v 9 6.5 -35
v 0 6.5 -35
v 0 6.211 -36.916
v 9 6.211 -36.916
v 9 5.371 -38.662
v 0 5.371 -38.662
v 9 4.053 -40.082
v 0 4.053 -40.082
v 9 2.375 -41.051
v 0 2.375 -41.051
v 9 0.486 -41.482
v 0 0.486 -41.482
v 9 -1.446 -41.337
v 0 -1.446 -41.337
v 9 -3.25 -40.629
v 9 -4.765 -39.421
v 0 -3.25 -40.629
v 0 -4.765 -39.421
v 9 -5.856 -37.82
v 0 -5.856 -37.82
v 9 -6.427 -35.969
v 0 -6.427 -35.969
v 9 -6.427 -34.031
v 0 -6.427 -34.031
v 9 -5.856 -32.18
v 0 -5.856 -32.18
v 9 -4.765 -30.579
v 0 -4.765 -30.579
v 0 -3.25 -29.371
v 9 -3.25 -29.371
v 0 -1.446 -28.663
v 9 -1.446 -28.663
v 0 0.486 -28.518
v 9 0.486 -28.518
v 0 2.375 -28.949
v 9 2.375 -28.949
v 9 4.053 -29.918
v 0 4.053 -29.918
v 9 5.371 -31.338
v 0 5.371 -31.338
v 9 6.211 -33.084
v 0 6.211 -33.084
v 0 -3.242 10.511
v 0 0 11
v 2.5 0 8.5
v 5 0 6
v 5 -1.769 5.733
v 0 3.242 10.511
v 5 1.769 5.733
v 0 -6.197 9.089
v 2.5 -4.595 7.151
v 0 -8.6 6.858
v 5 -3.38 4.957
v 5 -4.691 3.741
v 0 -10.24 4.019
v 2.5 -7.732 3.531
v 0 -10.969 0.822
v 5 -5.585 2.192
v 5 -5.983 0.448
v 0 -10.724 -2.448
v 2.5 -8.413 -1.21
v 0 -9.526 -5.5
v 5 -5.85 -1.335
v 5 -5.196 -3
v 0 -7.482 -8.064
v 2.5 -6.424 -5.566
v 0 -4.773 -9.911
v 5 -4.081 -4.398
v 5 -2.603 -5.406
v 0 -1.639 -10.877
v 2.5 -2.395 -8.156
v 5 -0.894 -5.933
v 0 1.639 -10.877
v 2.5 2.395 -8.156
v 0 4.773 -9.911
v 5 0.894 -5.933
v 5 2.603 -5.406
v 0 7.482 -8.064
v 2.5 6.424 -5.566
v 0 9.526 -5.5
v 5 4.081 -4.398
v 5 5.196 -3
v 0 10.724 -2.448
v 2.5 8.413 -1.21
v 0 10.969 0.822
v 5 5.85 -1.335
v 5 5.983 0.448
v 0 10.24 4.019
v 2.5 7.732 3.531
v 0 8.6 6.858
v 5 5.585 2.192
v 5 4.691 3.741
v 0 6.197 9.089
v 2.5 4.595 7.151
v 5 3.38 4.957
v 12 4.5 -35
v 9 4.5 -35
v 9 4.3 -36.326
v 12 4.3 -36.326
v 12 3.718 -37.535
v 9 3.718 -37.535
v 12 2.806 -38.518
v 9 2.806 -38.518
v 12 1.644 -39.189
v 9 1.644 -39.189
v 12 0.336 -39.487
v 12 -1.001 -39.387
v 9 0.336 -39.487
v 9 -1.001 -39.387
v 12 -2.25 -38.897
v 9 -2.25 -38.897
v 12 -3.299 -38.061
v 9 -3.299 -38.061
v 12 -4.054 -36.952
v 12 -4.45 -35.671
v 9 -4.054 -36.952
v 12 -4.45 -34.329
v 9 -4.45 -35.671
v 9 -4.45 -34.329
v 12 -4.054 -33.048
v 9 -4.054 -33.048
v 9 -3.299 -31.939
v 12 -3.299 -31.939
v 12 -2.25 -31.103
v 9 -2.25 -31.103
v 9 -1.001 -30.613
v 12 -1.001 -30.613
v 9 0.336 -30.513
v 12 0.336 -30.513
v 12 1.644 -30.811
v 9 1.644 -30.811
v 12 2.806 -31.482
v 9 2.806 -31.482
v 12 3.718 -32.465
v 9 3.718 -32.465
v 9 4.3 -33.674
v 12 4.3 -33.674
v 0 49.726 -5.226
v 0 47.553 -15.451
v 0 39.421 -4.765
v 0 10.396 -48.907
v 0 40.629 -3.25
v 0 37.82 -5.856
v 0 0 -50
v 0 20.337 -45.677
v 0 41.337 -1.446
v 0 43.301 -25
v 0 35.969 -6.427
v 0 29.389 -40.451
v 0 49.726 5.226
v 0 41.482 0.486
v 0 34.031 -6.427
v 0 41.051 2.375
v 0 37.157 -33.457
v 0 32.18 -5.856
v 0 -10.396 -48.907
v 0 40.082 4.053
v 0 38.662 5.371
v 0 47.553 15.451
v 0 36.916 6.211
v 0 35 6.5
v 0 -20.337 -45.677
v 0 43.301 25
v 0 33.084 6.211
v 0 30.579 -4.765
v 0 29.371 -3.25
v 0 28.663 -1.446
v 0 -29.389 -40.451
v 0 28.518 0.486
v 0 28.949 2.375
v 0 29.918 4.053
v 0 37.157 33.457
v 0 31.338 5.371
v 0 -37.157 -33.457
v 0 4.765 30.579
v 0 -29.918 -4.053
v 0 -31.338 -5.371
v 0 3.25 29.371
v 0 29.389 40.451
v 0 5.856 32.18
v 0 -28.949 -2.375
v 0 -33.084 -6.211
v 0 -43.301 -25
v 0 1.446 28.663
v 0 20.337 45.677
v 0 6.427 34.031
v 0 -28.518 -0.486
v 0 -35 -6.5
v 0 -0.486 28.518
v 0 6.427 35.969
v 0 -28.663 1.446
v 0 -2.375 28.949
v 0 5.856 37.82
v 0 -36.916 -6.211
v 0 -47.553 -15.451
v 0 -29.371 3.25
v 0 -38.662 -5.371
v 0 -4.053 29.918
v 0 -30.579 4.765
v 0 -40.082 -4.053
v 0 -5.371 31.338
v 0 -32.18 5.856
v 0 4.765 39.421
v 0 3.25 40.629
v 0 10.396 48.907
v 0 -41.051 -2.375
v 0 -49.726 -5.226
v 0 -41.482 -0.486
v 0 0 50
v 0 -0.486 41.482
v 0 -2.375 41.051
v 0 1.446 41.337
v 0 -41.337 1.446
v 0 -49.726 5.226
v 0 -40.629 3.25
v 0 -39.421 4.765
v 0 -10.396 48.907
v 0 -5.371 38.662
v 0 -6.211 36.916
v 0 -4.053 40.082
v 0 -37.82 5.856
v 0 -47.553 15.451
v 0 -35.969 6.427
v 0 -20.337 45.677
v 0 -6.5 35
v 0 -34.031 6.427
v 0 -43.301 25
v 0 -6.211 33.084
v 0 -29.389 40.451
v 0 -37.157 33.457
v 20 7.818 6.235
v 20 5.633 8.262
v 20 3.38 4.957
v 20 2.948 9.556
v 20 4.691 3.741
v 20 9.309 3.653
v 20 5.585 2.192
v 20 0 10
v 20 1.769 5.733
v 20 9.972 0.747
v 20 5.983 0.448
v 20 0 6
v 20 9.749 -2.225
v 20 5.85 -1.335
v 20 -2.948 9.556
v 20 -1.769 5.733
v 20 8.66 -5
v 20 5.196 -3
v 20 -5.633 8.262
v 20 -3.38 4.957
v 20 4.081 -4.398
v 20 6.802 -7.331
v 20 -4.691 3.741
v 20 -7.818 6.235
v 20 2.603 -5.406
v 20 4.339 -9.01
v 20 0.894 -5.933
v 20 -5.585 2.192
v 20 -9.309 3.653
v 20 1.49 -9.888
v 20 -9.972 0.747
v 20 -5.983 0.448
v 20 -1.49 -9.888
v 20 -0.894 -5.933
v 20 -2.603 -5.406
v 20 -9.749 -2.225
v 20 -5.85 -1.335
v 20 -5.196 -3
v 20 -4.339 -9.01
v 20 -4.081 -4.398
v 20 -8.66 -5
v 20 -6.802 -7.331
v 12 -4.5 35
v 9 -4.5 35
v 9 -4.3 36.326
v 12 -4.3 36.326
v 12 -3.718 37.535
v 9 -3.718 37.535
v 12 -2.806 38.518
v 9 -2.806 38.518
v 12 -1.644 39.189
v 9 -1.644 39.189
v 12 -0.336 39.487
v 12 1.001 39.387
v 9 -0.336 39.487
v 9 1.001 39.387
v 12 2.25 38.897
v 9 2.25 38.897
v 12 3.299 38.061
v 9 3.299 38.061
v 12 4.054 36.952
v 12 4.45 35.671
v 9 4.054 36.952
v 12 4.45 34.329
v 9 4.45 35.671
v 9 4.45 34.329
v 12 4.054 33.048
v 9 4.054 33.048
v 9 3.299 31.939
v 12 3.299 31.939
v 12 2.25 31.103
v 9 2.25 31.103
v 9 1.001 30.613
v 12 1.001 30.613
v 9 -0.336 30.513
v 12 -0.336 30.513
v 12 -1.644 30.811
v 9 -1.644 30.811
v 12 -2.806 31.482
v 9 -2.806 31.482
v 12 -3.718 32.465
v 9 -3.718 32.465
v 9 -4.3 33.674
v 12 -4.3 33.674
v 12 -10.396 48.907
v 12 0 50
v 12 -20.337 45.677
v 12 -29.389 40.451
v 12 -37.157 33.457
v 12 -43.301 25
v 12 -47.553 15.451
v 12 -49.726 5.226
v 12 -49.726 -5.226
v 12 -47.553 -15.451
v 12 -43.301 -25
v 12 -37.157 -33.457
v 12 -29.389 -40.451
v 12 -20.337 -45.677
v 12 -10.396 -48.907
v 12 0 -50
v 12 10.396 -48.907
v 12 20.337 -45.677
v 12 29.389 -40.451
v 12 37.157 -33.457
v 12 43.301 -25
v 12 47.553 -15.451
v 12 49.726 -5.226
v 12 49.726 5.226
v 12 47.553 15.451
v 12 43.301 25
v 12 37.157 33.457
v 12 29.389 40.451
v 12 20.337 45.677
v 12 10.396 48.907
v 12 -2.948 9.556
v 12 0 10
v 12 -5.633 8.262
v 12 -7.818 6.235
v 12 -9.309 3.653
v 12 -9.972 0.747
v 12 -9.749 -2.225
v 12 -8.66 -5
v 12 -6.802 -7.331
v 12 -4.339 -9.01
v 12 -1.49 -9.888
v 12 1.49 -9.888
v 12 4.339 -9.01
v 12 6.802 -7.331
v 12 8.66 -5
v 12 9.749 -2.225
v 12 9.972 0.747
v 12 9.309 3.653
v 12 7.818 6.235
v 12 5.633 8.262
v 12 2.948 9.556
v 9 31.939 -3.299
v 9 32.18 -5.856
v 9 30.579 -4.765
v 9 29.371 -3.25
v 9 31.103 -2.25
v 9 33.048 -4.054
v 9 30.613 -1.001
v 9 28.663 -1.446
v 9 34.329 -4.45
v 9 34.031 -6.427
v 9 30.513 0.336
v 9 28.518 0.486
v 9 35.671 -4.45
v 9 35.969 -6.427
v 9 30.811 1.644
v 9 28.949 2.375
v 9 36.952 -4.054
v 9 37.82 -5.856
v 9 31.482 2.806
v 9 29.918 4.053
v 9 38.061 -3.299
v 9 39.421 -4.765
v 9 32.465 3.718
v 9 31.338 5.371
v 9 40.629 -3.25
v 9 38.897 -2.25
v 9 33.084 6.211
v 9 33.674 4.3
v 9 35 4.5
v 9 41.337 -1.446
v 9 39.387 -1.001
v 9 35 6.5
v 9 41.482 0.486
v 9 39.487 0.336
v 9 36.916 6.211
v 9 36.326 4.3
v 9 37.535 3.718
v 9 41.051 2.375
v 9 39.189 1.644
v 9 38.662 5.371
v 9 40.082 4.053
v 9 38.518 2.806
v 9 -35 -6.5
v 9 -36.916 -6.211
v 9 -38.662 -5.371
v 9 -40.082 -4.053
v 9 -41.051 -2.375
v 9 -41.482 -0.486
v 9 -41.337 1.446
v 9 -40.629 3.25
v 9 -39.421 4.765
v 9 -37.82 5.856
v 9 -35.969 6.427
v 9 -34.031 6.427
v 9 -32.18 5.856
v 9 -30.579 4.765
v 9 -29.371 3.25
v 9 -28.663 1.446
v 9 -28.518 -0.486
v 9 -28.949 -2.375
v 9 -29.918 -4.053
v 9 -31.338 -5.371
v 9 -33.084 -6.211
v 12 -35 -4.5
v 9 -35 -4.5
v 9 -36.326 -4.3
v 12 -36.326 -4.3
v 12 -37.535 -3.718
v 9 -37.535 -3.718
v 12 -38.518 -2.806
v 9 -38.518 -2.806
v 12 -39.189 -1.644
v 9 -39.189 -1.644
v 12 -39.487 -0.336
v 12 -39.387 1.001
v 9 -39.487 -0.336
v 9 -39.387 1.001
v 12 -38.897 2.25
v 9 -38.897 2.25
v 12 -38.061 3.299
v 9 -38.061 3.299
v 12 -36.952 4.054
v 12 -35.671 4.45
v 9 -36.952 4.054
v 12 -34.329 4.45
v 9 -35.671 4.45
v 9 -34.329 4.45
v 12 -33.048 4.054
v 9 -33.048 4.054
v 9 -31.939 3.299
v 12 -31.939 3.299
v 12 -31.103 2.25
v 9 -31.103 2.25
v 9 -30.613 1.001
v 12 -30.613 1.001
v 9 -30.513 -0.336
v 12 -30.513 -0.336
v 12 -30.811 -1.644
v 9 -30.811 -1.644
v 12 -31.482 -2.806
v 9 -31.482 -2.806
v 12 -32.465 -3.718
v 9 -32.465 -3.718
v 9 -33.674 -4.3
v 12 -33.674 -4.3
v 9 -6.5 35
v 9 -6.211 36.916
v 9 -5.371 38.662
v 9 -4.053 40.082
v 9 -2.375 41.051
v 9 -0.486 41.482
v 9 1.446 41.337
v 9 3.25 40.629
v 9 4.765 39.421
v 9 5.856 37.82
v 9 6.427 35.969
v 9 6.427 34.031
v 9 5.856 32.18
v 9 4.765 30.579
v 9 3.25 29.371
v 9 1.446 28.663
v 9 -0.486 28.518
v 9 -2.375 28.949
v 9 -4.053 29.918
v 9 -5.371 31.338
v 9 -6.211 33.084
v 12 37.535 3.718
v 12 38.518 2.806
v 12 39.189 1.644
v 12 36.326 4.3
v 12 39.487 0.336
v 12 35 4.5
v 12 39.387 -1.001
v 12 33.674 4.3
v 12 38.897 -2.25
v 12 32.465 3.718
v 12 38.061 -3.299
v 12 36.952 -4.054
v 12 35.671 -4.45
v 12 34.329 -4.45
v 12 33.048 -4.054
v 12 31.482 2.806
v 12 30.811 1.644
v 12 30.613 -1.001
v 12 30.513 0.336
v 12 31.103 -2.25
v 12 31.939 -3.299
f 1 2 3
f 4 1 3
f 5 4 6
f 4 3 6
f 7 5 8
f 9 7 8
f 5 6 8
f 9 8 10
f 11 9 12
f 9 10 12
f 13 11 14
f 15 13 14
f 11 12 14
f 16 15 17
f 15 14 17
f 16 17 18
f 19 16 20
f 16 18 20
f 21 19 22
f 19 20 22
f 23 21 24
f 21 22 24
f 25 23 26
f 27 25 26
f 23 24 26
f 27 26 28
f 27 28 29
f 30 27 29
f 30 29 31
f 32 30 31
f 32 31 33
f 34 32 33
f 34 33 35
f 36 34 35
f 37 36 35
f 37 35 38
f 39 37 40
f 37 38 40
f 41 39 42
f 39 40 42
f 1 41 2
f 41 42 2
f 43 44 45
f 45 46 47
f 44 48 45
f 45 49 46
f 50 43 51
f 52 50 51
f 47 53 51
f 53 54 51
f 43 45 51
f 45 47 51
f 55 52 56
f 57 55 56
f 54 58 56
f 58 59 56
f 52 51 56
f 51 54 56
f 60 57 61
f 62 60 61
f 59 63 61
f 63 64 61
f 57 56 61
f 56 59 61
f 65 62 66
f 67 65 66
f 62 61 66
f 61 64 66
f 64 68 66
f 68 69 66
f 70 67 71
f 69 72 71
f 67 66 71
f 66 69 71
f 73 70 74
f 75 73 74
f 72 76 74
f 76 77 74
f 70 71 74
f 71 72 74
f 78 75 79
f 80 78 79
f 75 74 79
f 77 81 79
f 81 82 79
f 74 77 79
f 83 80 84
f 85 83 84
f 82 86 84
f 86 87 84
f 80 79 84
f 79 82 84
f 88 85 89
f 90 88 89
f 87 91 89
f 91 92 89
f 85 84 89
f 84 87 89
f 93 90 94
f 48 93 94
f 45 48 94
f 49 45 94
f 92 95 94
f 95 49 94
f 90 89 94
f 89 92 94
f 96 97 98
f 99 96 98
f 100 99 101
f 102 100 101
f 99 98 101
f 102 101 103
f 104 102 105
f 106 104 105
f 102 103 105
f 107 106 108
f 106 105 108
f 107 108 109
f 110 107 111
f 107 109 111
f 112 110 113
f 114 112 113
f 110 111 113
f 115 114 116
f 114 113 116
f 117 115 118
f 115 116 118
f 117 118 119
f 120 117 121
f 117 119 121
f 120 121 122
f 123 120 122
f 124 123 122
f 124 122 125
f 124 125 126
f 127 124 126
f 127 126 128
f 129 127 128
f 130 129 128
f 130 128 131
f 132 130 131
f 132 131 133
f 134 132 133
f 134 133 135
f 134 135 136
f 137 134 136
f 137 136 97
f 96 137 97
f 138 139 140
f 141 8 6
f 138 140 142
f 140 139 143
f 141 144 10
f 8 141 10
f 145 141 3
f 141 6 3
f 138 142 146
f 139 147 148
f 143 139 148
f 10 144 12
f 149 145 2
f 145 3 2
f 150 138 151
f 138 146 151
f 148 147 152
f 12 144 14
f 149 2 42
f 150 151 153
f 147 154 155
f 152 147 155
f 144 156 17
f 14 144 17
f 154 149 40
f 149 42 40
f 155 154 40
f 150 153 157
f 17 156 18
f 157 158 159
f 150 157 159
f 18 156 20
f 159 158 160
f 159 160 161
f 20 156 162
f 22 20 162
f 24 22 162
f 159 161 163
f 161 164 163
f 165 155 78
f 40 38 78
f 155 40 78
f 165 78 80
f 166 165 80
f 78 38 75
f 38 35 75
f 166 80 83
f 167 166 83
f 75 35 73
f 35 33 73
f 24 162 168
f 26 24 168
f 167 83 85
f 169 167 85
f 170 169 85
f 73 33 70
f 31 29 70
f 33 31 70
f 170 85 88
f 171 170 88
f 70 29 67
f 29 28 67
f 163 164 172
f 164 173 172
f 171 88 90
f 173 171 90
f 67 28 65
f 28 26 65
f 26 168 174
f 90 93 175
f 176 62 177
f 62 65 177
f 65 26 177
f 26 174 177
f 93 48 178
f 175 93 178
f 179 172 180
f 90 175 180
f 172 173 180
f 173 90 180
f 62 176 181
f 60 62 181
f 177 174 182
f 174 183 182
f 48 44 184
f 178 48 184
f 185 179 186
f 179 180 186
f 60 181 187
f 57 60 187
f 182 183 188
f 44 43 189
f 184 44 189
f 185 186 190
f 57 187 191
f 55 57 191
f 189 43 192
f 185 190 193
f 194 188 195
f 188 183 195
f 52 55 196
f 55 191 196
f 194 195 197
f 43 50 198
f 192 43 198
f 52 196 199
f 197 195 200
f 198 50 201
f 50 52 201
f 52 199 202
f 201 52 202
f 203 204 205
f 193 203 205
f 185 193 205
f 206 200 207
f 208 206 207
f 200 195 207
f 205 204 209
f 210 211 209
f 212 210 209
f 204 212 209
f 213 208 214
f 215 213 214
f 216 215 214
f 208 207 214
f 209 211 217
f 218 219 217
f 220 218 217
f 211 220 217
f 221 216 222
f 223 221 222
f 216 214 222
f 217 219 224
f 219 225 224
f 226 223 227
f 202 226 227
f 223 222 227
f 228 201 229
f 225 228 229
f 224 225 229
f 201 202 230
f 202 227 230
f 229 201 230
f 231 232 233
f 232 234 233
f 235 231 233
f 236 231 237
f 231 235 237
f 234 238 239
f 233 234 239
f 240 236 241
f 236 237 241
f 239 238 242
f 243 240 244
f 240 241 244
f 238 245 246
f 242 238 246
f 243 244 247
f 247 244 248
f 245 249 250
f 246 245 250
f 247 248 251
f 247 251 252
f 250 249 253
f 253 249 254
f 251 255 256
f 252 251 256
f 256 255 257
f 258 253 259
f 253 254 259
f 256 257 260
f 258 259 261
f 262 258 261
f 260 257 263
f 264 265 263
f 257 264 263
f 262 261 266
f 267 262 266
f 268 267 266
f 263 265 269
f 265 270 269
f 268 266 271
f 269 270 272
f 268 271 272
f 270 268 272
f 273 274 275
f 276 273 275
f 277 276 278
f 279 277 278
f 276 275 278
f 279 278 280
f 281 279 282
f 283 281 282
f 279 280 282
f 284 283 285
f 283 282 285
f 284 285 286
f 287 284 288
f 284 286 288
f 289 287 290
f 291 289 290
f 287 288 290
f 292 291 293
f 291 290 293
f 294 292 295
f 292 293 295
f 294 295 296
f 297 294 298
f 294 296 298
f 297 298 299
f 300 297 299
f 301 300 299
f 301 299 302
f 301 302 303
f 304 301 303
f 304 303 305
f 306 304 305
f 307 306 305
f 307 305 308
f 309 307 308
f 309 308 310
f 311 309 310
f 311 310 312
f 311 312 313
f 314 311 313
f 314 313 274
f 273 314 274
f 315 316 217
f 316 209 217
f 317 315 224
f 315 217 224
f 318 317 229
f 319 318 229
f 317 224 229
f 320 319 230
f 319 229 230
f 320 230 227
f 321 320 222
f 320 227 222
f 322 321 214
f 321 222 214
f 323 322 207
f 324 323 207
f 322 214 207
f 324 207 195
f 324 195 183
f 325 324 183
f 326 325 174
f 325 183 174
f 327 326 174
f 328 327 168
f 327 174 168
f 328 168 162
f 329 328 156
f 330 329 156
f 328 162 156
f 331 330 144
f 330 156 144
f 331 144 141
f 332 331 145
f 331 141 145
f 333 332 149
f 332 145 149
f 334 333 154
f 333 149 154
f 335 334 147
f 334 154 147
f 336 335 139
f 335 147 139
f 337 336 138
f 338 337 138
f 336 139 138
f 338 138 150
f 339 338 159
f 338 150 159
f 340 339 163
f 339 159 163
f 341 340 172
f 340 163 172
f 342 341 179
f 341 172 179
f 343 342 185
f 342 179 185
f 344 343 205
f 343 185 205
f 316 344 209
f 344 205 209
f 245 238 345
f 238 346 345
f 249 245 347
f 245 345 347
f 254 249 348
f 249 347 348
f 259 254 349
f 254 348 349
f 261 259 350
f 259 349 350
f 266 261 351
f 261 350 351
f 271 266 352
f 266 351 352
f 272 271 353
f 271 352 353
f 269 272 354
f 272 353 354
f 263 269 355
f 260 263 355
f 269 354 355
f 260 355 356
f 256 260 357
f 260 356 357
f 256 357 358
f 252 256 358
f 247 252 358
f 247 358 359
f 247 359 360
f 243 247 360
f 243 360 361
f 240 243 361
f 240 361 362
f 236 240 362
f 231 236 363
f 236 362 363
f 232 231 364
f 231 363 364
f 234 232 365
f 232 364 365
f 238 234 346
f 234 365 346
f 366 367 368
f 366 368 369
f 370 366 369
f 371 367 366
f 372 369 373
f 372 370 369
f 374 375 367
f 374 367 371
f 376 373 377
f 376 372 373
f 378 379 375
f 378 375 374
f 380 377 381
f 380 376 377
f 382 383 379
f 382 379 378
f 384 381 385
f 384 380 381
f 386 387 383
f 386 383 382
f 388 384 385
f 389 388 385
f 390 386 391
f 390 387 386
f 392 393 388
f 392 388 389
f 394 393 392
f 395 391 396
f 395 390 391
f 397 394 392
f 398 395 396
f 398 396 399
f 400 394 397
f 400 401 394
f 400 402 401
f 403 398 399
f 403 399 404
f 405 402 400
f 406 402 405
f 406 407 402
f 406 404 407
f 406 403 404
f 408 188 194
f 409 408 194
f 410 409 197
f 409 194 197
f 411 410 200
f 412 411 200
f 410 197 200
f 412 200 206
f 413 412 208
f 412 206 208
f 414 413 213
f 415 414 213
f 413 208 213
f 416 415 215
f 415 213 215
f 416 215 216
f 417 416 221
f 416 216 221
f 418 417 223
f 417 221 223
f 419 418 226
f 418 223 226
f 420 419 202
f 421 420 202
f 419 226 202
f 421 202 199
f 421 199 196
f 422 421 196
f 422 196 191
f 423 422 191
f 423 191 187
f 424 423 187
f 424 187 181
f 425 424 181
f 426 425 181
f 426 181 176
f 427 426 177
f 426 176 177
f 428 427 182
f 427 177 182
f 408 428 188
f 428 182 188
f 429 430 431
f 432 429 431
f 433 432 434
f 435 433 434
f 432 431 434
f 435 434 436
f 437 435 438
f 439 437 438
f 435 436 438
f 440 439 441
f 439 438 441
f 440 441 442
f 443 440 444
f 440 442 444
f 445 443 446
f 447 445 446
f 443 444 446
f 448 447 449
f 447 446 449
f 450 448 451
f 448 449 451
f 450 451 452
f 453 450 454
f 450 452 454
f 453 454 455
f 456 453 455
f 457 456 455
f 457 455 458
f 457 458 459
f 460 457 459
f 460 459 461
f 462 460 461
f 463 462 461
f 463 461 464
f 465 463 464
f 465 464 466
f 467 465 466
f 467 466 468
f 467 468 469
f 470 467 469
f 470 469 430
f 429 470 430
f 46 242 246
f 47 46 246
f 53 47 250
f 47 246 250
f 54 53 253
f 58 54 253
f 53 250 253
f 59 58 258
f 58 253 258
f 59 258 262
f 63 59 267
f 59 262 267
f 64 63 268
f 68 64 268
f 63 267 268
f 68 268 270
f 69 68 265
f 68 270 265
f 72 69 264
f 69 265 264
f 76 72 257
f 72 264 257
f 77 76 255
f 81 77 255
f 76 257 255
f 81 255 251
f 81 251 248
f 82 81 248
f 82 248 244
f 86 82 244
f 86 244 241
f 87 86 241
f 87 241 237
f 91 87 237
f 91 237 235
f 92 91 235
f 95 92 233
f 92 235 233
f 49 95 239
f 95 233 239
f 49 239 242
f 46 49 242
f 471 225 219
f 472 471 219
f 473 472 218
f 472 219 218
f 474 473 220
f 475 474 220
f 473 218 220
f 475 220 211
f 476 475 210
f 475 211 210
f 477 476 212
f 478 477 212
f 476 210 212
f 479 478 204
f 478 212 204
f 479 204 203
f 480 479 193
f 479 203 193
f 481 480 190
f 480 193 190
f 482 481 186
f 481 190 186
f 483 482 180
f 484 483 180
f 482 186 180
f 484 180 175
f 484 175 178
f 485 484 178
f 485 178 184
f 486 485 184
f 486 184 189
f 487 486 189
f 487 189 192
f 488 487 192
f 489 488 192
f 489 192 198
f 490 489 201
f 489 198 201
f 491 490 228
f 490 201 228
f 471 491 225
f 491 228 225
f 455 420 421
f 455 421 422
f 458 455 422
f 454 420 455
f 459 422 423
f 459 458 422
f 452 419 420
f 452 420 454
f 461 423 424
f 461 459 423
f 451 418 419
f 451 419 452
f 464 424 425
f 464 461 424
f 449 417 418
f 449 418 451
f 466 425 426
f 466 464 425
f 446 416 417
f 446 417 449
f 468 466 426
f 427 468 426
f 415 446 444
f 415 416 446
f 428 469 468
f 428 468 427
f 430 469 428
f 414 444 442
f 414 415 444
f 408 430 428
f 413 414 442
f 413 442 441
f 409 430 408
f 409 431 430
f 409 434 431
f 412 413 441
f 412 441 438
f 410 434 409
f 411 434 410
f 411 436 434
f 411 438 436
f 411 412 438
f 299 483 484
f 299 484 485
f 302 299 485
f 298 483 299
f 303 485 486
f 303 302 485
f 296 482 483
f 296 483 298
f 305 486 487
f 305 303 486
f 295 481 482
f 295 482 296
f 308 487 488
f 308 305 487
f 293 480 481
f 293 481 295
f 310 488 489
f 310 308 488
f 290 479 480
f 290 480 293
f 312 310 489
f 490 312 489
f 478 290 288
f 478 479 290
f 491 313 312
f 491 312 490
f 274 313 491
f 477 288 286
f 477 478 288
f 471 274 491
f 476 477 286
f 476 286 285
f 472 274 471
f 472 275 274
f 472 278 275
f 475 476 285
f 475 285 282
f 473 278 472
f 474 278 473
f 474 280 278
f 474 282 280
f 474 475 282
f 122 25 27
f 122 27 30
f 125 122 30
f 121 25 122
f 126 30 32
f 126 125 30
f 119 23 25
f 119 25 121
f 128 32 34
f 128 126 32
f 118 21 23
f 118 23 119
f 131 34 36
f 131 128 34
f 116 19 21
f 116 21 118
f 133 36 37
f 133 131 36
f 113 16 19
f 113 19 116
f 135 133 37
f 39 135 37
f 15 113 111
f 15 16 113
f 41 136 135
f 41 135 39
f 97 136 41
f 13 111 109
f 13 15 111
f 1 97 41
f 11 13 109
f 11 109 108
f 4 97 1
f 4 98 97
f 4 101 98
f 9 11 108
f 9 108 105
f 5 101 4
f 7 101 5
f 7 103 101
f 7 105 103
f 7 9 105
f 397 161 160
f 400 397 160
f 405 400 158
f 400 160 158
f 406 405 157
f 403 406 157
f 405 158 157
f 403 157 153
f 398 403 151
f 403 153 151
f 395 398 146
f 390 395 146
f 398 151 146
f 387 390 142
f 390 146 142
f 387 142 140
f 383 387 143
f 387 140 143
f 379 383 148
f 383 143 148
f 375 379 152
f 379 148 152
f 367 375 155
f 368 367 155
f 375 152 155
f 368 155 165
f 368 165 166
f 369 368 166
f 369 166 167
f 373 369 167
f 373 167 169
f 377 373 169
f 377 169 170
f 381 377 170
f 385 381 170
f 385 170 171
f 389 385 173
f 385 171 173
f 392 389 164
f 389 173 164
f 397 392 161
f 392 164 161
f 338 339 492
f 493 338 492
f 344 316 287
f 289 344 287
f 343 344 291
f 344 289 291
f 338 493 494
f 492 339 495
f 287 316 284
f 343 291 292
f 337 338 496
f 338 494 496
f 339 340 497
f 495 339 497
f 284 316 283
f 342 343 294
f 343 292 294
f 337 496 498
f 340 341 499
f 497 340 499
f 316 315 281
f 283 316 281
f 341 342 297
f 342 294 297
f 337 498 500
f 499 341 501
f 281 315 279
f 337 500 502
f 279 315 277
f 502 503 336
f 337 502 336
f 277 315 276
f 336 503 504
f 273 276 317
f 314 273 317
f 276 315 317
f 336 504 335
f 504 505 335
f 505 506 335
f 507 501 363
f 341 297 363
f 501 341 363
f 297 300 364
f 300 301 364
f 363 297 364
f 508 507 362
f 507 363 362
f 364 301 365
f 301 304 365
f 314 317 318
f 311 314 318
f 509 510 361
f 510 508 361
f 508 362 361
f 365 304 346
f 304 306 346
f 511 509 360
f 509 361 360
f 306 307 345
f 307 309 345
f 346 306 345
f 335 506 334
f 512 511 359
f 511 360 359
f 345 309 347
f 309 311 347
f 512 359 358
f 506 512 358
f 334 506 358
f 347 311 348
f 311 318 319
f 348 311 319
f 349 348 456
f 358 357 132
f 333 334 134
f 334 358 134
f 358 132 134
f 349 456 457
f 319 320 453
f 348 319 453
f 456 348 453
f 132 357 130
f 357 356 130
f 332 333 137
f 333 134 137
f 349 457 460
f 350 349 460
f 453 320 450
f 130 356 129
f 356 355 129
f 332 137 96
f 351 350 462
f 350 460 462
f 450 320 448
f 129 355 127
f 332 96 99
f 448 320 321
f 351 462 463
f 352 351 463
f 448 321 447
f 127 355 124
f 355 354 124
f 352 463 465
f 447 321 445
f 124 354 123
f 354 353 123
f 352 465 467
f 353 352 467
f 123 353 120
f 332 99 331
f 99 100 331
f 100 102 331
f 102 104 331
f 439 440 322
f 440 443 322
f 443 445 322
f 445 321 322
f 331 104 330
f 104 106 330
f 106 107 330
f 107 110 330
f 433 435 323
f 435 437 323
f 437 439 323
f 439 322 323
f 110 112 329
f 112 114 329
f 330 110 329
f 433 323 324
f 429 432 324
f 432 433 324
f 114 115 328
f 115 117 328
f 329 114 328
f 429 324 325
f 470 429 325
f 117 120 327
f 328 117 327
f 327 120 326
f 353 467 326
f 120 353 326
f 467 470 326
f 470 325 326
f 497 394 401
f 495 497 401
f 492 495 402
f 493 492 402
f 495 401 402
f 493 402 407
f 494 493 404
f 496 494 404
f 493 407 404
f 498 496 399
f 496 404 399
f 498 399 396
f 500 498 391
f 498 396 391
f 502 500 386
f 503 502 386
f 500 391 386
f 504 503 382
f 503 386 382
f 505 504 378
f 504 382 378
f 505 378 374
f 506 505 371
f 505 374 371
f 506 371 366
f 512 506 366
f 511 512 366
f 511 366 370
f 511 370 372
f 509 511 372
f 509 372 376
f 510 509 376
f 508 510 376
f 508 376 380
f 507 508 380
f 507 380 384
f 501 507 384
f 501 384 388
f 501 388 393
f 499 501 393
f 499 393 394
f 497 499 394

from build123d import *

# Parameters (mm, degrees)
F2_R     = 6.5
F2_R_2   = 4.5
F3_DEPTH = 9
F4_DEPTH = 12
F5_COUNT = 4
F5_ANGLE = 270
F6_SIZE  = 5


with BuildPart() as f1:
    # F0 (on Front) → F1 (revolve)
    with BuildSketch(Plane.XZ):
        Polygon((0, 50), (0, 6), (20, 6), (20, 10), (12, 10), (12, 50), align=None)
    revolve(axis=Axis((48.1764731588, 0, 0), (1, 0, 0)))

    # F2 (on face) → F3 (cut)
    with BuildSketch(Plane(origin=(0, 0, 0), x_dir=(0, -1, 0), z_dir=(-1, 0, 0))):
        with Locations((0, 35)):
            Circle(F2_R)
        with Locations((0, 35)):
            Circle(F2_R_2, mode=Mode.SUBTRACT)
    f3 = extrude(amount=-F3_DEPTH, mode=Mode.SUBTRACT)

    # F2 (on face) → F4 (cut)
    with BuildSketch(Plane(origin=(0, 0, 0), x_dir=(0, -1, 0), z_dir=(-1, 0, 0))):
        with Locations((0, 35)):
            Circle(F2_R_2)
    f4 = extrude(amount=-F4_DEPTH, mode=Mode.SUBTRACT)

    # F5: F3, F4 ×4 about axis
    f5_axis = Axis((48.1764731588, 0, 0), (1, 0, 0))
    for i in range(1, F5_COUNT):
        add(f3.rotate(f5_axis, i * F5_ANGLE / (F5_COUNT - 1)), mode=Mode.SUBTRACT)
        add(f4.rotate(f5_axis, i * F5_ANGLE / (F5_COUNT - 1)), mode=Mode.SUBTRACT)

    # F6
    f6_edges = [f1.edges().sort_by_distance(p)[0] for p in [
        (0, 0, -6),
    ]]
    chamfer(f6_edges, length=F6_SIZE)


solid = f1.part
